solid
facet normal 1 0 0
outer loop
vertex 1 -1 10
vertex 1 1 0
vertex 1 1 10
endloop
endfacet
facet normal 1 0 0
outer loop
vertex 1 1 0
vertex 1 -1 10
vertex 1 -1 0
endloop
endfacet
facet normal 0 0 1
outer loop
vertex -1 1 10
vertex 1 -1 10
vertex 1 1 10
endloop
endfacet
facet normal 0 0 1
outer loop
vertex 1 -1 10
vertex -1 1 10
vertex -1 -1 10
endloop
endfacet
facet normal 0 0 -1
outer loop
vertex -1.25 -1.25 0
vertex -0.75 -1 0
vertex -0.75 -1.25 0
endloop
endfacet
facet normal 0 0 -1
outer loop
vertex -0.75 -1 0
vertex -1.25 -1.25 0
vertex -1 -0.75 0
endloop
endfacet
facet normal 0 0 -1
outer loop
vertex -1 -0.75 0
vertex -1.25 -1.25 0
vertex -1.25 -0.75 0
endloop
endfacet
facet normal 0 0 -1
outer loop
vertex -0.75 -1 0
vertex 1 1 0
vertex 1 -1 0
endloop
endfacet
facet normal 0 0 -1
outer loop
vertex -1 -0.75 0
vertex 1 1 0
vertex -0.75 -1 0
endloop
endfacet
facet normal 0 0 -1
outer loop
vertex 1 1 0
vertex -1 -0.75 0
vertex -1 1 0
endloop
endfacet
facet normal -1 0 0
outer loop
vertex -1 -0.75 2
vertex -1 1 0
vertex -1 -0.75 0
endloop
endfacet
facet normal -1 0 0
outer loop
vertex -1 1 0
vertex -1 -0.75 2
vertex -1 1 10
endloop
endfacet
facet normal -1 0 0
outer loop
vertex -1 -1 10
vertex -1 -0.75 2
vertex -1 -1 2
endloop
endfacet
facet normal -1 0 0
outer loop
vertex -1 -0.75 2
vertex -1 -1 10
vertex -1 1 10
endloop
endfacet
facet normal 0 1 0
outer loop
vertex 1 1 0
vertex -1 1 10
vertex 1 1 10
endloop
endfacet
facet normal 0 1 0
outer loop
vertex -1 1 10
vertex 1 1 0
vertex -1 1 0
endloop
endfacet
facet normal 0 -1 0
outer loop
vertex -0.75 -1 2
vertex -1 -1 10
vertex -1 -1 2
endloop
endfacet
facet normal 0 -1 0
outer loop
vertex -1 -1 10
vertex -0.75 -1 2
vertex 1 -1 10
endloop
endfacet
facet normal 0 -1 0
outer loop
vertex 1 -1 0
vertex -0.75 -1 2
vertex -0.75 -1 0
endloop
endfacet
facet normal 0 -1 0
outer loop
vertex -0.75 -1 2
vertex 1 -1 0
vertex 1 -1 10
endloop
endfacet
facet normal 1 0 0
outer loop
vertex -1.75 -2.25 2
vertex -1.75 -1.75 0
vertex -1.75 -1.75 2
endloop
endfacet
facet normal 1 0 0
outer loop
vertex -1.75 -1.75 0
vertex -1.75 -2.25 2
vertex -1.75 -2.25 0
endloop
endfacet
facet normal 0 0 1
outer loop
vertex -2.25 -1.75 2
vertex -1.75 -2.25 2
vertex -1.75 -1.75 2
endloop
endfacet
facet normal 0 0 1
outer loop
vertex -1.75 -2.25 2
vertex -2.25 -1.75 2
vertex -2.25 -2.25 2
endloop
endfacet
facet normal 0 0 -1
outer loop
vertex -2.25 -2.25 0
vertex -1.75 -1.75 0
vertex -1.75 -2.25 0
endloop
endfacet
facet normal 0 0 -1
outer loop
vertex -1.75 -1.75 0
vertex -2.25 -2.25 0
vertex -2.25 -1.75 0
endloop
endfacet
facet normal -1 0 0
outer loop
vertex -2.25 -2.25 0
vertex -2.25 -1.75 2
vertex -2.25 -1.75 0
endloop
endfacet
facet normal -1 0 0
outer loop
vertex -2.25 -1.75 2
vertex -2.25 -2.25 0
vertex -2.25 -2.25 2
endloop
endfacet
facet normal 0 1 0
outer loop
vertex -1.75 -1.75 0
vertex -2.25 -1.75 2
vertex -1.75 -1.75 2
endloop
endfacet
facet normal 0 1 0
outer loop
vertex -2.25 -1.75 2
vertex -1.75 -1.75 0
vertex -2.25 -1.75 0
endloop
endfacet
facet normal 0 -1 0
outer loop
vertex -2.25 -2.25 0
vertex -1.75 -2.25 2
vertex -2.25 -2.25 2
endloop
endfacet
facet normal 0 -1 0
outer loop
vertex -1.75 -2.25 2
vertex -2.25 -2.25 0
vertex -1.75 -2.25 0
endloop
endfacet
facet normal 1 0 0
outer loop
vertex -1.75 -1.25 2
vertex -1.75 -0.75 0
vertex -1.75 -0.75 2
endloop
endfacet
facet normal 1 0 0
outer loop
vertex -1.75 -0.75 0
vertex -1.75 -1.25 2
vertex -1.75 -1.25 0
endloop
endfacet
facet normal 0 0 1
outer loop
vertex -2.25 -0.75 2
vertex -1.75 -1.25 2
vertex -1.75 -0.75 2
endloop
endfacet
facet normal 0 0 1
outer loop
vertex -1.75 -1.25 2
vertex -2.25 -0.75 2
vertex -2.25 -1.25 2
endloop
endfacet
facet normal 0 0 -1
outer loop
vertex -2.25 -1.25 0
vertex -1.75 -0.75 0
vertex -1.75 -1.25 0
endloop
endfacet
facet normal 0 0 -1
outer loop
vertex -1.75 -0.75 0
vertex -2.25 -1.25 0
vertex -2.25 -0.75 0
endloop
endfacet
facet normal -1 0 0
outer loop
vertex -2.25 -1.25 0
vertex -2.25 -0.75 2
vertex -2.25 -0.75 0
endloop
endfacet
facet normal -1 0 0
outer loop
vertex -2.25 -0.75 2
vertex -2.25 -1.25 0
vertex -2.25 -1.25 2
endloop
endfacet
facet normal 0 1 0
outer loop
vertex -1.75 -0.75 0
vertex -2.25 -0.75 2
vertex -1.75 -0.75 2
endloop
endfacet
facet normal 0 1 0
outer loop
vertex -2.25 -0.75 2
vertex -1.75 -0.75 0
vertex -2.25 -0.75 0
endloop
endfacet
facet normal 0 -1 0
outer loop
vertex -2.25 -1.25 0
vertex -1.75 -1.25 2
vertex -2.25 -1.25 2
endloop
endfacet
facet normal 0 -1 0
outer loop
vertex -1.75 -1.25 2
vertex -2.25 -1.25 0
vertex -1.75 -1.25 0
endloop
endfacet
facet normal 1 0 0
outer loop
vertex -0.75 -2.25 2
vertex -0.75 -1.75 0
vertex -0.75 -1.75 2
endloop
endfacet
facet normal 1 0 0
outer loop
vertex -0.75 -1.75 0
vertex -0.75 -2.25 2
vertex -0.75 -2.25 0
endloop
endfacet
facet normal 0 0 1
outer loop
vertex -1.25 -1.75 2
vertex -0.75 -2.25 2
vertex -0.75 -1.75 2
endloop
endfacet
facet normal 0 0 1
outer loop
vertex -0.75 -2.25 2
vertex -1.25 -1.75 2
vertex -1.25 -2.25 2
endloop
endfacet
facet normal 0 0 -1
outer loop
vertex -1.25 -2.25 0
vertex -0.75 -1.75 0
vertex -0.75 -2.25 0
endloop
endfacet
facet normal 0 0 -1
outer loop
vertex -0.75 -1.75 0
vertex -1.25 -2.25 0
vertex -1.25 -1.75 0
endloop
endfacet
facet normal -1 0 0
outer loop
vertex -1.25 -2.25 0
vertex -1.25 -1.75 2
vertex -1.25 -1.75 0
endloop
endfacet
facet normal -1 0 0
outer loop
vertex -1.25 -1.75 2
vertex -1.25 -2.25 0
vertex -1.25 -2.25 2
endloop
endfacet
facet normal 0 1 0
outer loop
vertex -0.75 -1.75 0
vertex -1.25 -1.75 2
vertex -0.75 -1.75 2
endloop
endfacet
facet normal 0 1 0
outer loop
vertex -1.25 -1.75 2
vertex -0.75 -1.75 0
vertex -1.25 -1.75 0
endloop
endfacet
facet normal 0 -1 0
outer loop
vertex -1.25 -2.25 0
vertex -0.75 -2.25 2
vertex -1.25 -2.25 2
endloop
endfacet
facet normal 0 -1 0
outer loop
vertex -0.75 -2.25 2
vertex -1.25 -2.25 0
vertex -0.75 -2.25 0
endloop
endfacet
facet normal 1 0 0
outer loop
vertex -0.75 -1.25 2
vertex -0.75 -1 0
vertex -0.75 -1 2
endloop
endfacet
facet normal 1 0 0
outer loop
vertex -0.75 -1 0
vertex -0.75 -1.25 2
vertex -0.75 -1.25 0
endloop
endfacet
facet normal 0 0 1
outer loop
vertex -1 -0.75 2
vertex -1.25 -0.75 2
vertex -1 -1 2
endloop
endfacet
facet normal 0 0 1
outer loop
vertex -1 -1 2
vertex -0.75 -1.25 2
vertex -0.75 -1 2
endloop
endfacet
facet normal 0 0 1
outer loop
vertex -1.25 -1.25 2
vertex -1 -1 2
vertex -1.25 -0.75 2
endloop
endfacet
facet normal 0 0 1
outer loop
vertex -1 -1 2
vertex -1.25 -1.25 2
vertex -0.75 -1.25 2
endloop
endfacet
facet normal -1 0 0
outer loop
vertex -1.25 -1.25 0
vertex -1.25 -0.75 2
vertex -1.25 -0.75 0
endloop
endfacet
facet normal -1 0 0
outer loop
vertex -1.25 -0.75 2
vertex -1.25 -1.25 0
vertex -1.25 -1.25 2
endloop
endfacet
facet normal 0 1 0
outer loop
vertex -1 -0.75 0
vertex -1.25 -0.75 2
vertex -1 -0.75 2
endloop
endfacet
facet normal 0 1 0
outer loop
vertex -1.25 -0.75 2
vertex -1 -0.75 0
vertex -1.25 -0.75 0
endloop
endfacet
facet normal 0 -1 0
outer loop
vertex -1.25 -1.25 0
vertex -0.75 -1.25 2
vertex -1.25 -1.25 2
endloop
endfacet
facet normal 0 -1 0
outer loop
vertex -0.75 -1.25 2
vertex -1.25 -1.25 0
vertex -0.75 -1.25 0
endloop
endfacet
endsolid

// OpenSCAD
translate([0, 0, 5]) color([0,1,0,0.9]) cube([2, 2, 10], center=true);
translate([-2.0, -2.0, 1]) color([1,0,0]) cube([0.5, 0.5, 2], center=true);
translate([-2.0, -1.0, 1]) color([1,0,0]) cube([0.5, 0.5, 2], center=true);
translate([-1.0, -2.0, 1]) color([1,0,0]) cube([0.5, 0.5, 2], center=true);
translate([-1.0, -1.0, 1]) color([1,0,0]) cube([0.5, 0.5, 2], center=true);
